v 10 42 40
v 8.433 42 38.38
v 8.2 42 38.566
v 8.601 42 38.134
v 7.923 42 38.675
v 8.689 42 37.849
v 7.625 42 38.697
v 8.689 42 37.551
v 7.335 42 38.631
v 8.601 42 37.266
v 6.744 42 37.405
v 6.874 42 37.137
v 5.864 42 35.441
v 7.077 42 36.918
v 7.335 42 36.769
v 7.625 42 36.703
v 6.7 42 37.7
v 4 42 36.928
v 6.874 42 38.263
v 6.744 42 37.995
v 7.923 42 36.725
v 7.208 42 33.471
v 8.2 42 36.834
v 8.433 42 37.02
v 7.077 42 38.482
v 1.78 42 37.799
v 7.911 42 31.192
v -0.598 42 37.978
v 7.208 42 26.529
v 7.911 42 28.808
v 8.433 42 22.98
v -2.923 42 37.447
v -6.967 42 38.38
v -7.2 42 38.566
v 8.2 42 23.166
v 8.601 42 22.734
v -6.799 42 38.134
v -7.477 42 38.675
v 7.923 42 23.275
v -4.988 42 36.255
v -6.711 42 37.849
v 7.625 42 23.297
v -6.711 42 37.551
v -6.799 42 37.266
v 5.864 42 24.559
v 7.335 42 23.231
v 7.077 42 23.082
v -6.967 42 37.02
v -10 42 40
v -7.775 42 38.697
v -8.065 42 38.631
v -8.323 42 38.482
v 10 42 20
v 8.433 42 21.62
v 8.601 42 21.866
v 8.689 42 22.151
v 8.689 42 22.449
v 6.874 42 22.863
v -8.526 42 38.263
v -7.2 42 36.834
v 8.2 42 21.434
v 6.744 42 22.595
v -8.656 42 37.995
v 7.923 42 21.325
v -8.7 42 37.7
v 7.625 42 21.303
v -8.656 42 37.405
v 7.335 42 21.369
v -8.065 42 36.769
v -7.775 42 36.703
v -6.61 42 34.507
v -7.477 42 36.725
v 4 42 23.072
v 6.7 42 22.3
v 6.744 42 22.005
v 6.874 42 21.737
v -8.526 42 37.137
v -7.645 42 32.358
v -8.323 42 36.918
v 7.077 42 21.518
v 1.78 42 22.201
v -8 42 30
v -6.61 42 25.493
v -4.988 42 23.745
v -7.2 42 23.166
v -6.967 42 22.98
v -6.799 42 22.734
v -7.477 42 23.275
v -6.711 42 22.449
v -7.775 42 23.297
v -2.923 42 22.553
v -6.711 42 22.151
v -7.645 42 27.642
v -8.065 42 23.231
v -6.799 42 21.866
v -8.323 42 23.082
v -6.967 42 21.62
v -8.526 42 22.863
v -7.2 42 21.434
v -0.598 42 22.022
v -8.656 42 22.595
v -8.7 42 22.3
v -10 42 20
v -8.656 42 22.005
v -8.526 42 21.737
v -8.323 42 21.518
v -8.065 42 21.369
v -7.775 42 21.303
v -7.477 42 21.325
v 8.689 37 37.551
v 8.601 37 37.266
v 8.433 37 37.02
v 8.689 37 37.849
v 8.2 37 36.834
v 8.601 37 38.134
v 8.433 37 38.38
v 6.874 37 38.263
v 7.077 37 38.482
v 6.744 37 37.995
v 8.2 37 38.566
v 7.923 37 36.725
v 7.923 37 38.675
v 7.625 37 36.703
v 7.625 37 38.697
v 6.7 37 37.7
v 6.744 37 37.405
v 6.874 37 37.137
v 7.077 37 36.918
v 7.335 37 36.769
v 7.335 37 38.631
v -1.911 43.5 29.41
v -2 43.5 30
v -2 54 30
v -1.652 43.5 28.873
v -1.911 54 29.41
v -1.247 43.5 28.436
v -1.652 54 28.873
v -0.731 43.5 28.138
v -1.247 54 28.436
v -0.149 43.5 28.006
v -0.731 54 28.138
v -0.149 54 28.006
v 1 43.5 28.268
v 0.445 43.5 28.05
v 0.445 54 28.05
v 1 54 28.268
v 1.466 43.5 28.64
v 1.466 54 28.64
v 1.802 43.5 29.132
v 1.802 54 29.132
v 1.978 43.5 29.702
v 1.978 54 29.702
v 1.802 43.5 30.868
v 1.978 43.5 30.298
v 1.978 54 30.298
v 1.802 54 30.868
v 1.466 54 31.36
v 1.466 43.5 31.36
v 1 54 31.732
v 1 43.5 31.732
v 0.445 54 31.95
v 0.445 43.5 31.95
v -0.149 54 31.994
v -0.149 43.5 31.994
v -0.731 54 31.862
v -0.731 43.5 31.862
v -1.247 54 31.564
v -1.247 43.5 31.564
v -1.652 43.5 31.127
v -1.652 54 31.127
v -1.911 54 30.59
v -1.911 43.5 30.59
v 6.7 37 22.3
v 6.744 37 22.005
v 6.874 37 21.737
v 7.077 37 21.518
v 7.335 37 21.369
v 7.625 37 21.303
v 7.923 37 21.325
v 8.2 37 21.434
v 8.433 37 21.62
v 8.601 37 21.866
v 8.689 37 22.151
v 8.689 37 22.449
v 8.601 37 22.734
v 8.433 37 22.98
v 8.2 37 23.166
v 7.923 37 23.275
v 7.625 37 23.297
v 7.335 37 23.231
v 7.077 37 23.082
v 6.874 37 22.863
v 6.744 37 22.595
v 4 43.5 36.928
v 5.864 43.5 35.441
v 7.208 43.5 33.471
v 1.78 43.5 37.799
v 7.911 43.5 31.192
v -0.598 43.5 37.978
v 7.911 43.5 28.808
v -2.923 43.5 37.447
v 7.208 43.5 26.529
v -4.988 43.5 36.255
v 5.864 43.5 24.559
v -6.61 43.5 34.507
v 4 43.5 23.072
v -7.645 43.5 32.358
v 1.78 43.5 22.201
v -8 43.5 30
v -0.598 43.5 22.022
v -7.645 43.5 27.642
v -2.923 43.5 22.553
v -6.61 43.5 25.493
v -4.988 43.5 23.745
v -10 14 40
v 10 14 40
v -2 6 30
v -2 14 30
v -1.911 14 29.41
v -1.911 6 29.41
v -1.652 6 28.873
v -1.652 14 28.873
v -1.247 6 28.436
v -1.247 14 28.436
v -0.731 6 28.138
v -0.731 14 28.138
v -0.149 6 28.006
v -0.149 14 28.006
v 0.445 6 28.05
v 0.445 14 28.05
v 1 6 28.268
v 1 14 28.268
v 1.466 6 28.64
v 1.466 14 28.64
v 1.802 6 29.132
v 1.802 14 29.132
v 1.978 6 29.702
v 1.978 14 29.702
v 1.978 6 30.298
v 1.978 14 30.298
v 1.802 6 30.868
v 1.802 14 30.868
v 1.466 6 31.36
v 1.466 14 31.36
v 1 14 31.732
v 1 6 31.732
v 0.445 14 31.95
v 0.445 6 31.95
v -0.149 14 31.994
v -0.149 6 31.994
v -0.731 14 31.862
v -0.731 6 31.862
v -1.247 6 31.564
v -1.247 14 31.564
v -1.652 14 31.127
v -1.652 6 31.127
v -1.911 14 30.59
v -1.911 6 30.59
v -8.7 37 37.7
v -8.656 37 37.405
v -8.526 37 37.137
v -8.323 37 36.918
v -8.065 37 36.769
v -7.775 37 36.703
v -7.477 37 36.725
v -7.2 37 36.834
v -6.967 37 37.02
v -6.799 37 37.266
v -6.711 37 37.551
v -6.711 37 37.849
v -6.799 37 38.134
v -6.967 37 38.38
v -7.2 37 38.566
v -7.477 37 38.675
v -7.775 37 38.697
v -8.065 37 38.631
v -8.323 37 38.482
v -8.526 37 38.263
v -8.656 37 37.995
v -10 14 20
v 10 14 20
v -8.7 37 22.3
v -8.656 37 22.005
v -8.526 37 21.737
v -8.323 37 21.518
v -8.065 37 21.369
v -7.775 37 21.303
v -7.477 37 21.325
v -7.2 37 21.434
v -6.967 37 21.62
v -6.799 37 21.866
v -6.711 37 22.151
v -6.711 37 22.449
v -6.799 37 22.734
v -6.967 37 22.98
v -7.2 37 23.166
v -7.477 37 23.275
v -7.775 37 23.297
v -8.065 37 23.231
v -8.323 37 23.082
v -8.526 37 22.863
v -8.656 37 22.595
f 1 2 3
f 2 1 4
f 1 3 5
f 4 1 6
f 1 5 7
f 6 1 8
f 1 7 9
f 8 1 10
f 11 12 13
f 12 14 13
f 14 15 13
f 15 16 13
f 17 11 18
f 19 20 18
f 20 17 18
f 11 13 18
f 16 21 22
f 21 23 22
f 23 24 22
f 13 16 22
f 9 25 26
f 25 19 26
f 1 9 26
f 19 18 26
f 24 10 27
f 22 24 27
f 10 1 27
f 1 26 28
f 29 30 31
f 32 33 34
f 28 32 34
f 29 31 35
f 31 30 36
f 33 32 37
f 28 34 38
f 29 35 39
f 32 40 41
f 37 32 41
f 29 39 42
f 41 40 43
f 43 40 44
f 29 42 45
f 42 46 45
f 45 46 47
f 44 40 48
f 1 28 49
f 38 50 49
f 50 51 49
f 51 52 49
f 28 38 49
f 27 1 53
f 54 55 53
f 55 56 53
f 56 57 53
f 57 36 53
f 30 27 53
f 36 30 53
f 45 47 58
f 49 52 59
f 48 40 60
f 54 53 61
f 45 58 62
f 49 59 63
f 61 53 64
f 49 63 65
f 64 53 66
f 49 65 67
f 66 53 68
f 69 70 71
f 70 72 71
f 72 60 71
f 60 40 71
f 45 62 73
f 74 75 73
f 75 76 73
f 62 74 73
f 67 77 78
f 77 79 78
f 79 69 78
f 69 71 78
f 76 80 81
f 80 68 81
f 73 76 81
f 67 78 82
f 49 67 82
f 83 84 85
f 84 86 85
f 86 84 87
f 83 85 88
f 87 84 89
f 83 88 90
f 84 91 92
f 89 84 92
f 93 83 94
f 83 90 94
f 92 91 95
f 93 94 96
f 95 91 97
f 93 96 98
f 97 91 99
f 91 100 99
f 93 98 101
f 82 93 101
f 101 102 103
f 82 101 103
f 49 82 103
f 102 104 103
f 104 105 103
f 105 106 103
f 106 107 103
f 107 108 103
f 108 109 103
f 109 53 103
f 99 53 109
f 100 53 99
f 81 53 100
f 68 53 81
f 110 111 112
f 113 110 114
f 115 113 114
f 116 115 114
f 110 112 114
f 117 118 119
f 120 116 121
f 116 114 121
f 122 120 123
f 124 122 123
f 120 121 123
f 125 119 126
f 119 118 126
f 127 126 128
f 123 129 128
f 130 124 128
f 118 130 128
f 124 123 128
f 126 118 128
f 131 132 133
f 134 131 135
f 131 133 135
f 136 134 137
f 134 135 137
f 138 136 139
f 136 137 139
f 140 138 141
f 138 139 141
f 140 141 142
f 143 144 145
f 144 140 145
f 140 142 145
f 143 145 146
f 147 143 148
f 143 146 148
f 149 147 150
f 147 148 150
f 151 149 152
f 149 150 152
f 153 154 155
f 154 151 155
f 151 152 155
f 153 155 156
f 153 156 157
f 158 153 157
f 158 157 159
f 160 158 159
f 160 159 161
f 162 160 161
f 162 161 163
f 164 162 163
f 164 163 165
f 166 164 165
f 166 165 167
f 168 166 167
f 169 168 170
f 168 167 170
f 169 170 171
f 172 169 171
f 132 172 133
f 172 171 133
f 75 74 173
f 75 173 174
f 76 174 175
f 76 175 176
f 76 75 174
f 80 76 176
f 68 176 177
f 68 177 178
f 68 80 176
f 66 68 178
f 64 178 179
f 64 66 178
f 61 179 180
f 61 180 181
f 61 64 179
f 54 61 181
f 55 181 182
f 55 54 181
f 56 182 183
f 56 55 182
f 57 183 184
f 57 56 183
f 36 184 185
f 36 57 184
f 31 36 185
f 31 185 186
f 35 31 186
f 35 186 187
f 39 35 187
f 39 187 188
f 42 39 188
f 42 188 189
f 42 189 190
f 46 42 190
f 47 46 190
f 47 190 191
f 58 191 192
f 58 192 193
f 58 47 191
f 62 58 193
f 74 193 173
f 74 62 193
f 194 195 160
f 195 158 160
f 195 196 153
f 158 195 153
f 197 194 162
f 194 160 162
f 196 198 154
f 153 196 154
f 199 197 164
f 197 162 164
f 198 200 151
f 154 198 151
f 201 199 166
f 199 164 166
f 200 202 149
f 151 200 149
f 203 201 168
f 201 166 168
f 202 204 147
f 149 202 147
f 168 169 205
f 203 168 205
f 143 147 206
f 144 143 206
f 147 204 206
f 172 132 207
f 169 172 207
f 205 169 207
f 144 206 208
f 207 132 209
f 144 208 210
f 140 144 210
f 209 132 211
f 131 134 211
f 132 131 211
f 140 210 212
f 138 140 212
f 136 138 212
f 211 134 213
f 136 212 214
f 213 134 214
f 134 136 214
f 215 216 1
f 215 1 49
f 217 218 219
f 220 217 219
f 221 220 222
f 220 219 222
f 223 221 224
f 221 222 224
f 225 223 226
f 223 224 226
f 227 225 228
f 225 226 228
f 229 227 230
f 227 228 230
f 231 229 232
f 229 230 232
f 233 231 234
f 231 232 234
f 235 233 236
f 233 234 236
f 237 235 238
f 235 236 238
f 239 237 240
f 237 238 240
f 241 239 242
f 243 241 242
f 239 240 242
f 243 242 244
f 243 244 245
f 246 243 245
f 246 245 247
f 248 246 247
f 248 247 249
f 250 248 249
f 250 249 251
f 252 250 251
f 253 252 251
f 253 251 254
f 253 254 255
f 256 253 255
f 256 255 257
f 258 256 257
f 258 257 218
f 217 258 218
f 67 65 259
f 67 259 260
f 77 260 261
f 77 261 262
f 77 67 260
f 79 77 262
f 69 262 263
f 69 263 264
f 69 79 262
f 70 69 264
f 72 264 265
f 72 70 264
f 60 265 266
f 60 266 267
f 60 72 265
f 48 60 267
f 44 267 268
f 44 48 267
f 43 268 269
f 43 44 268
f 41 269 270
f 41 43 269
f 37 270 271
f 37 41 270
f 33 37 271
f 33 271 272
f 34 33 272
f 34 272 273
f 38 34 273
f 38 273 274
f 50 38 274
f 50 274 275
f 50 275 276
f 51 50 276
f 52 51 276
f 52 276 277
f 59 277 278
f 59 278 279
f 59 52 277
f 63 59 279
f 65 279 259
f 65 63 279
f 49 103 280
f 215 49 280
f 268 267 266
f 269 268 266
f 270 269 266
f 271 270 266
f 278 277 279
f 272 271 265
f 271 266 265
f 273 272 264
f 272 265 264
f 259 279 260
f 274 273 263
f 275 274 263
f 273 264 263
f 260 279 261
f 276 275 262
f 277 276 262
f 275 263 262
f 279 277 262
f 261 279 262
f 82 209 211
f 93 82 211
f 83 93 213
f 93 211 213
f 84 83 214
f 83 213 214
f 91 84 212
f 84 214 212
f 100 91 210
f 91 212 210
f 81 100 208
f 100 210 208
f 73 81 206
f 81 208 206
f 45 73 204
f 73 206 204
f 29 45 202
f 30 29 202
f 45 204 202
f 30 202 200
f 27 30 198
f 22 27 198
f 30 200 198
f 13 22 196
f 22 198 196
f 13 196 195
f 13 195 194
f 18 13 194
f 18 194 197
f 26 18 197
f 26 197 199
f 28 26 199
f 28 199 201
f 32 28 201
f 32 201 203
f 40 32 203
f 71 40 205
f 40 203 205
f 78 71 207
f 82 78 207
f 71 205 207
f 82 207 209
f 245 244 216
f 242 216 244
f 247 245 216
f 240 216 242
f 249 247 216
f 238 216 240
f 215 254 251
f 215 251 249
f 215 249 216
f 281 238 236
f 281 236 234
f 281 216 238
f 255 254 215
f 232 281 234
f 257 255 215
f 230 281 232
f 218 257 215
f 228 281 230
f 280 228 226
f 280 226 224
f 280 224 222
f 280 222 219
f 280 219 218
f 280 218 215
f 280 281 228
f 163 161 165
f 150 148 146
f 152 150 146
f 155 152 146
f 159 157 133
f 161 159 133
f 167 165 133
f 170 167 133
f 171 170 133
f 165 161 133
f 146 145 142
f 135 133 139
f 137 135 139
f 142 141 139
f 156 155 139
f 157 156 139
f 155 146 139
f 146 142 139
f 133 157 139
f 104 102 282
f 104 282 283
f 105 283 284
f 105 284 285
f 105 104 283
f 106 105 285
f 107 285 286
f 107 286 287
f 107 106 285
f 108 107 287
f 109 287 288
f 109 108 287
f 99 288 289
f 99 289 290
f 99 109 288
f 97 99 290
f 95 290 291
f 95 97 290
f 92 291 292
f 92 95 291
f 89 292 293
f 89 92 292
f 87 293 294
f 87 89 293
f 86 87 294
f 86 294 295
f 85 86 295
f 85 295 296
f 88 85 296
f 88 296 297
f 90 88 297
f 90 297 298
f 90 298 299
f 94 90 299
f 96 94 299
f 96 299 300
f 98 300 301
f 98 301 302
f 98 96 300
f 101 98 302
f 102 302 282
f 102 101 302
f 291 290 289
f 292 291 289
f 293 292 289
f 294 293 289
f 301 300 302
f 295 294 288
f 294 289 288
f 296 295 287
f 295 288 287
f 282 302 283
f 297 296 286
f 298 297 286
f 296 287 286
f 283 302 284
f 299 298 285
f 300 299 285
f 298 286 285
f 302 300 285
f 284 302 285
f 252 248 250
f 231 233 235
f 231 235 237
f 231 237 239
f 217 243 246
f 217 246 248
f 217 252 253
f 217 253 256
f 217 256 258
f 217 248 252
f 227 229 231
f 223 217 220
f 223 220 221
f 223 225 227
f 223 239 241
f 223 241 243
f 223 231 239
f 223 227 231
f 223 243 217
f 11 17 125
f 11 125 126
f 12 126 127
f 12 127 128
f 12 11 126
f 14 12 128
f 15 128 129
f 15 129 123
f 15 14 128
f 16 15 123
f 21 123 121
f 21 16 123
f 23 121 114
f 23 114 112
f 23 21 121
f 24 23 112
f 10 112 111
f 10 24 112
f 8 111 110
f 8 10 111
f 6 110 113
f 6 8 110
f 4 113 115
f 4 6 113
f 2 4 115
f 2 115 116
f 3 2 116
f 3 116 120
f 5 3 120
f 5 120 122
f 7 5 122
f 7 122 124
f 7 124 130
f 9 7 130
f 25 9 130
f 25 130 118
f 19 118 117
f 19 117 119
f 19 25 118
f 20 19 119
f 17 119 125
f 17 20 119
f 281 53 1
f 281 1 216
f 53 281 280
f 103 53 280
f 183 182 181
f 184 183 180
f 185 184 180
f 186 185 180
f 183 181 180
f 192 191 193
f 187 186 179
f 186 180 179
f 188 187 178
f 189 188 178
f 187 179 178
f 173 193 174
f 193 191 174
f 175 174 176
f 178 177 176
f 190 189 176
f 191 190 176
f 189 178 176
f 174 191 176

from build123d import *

# Parameters (mm, degrees)
CYLINDER009_R          = 1
CYLINDER009_DEPTH      = 5
CYLINDER010_R          = 1
CYLINDER010_DEPTH      = 5
CYLINDER011_R          = 1
CYLINDER011_DEPTH      = 5
CYLINDER008_R          = 1
CYLINDER008_DEPTH      = 5
CYLINDER007_R          = 8
CYLINDER007_DEPTH      = 1.5
CYLINDER013_R          = 2
CYLINDER013_DEPTH      = 48
BOX001_W               = 20
BOX001_H               = 28
BOX001_DEPTH           = 20
CUT001_PLACEMENT_ANGLE = 180


with BuildPart() as cylinder009:
    # Cylinder009 → Cylinder009 (new body)
    with BuildSketch(Plane(origin=(-7.7, 0, 7.7), x_dir=(1, 0, 0), z_dir=(0, 1, 0))):
        Circle(CYLINDER009_R)
    extrude(amount=CYLINDER009_DEPTH)


with BuildPart() as cylinder010:
    # Cylinder010 → Cylinder010 (new body)
    with BuildSketch(Plane(origin=(7.7, 0, -7.7), x_dir=(1, 0, 0), z_dir=(0, 1, 0))):
        Circle(CYLINDER010_R)
    extrude(amount=CYLINDER010_DEPTH)


with BuildPart() as cylinder011:
    # Cylinder011 → Cylinder011 (new body)
    with BuildSketch(Plane(origin=(7.7, 0, 7.7), x_dir=(1, 0, 0), z_dir=(0, 1, 0))):
        Circle(CYLINDER011_R)
    extrude(amount=CYLINDER011_DEPTH)


with BuildPart() as fusion004:
    # Cylinder008 → Cylinder008 (new body)
    with BuildSketch(Plane(origin=(-7.7, 0, -7.7), x_dir=(1, 0, 0), z_dir=(0, 1, 0))):
        Circle(CYLINDER008_R)
    extrude(amount=CYLINDER008_DEPTH)

    # Fusion004: union Cylinder009, Cylinder010, Cylinder011
    add(cylinder009.part)
    add(cylinder010.part)
    add(cylinder011.part)


with BuildPart() as cylinder007:
    # Cylinder007 → Cylinder007 (new body)
    with BuildSketch(Plane(origin=(0, -1.5, 0), x_dir=(1, 0, 0), z_dir=(0, 1, 0))):
        Circle(CYLINDER007_R)
    extrude(amount=CYLINDER007_DEPTH)


with BuildPart() as cylinder013:
    # Cylinder013 → Cylinder013 (new body)
    with BuildSketch(Plane(origin=(0, -12, 0), x_dir=(1, 0, 0), z_dir=(0, 1, 0))):
        Circle(CYLINDER013_R)
    extrude(amount=CYLINDER013_DEPTH)


with BuildPart() as doubleshaftstepper:
    # Box001 → Box001 (new body)
    with BuildSketch(Plane(origin=(-10, 0, -10), x_dir=(1, 0, 0), z_dir=(0, 0, 1))):
        with Locations((10, 14)):
            Rectangle(BOX001_W, BOX001_H)
    extrude(amount=BOX001_DEPTH)

    # Fusion003: union Cylinder007, Cylinder013
    add(cylinder007.part)
    add(cylinder013.part)

    # Cut001: cut Fusion004
    add(fusion004.part, mode=Mode.SUBTRACT)


with BuildPart() as doubleshaftstepper_1:
    # Cut001 placement: moved
    add(doubleshaftstepper.part.moved(Location((0, 42, 30))).rotate(Axis((0, 42, 30), (0, 0, 1)), CUT001_PLACEMENT_ANGLE))


solid = doubleshaftstepper_1.part
